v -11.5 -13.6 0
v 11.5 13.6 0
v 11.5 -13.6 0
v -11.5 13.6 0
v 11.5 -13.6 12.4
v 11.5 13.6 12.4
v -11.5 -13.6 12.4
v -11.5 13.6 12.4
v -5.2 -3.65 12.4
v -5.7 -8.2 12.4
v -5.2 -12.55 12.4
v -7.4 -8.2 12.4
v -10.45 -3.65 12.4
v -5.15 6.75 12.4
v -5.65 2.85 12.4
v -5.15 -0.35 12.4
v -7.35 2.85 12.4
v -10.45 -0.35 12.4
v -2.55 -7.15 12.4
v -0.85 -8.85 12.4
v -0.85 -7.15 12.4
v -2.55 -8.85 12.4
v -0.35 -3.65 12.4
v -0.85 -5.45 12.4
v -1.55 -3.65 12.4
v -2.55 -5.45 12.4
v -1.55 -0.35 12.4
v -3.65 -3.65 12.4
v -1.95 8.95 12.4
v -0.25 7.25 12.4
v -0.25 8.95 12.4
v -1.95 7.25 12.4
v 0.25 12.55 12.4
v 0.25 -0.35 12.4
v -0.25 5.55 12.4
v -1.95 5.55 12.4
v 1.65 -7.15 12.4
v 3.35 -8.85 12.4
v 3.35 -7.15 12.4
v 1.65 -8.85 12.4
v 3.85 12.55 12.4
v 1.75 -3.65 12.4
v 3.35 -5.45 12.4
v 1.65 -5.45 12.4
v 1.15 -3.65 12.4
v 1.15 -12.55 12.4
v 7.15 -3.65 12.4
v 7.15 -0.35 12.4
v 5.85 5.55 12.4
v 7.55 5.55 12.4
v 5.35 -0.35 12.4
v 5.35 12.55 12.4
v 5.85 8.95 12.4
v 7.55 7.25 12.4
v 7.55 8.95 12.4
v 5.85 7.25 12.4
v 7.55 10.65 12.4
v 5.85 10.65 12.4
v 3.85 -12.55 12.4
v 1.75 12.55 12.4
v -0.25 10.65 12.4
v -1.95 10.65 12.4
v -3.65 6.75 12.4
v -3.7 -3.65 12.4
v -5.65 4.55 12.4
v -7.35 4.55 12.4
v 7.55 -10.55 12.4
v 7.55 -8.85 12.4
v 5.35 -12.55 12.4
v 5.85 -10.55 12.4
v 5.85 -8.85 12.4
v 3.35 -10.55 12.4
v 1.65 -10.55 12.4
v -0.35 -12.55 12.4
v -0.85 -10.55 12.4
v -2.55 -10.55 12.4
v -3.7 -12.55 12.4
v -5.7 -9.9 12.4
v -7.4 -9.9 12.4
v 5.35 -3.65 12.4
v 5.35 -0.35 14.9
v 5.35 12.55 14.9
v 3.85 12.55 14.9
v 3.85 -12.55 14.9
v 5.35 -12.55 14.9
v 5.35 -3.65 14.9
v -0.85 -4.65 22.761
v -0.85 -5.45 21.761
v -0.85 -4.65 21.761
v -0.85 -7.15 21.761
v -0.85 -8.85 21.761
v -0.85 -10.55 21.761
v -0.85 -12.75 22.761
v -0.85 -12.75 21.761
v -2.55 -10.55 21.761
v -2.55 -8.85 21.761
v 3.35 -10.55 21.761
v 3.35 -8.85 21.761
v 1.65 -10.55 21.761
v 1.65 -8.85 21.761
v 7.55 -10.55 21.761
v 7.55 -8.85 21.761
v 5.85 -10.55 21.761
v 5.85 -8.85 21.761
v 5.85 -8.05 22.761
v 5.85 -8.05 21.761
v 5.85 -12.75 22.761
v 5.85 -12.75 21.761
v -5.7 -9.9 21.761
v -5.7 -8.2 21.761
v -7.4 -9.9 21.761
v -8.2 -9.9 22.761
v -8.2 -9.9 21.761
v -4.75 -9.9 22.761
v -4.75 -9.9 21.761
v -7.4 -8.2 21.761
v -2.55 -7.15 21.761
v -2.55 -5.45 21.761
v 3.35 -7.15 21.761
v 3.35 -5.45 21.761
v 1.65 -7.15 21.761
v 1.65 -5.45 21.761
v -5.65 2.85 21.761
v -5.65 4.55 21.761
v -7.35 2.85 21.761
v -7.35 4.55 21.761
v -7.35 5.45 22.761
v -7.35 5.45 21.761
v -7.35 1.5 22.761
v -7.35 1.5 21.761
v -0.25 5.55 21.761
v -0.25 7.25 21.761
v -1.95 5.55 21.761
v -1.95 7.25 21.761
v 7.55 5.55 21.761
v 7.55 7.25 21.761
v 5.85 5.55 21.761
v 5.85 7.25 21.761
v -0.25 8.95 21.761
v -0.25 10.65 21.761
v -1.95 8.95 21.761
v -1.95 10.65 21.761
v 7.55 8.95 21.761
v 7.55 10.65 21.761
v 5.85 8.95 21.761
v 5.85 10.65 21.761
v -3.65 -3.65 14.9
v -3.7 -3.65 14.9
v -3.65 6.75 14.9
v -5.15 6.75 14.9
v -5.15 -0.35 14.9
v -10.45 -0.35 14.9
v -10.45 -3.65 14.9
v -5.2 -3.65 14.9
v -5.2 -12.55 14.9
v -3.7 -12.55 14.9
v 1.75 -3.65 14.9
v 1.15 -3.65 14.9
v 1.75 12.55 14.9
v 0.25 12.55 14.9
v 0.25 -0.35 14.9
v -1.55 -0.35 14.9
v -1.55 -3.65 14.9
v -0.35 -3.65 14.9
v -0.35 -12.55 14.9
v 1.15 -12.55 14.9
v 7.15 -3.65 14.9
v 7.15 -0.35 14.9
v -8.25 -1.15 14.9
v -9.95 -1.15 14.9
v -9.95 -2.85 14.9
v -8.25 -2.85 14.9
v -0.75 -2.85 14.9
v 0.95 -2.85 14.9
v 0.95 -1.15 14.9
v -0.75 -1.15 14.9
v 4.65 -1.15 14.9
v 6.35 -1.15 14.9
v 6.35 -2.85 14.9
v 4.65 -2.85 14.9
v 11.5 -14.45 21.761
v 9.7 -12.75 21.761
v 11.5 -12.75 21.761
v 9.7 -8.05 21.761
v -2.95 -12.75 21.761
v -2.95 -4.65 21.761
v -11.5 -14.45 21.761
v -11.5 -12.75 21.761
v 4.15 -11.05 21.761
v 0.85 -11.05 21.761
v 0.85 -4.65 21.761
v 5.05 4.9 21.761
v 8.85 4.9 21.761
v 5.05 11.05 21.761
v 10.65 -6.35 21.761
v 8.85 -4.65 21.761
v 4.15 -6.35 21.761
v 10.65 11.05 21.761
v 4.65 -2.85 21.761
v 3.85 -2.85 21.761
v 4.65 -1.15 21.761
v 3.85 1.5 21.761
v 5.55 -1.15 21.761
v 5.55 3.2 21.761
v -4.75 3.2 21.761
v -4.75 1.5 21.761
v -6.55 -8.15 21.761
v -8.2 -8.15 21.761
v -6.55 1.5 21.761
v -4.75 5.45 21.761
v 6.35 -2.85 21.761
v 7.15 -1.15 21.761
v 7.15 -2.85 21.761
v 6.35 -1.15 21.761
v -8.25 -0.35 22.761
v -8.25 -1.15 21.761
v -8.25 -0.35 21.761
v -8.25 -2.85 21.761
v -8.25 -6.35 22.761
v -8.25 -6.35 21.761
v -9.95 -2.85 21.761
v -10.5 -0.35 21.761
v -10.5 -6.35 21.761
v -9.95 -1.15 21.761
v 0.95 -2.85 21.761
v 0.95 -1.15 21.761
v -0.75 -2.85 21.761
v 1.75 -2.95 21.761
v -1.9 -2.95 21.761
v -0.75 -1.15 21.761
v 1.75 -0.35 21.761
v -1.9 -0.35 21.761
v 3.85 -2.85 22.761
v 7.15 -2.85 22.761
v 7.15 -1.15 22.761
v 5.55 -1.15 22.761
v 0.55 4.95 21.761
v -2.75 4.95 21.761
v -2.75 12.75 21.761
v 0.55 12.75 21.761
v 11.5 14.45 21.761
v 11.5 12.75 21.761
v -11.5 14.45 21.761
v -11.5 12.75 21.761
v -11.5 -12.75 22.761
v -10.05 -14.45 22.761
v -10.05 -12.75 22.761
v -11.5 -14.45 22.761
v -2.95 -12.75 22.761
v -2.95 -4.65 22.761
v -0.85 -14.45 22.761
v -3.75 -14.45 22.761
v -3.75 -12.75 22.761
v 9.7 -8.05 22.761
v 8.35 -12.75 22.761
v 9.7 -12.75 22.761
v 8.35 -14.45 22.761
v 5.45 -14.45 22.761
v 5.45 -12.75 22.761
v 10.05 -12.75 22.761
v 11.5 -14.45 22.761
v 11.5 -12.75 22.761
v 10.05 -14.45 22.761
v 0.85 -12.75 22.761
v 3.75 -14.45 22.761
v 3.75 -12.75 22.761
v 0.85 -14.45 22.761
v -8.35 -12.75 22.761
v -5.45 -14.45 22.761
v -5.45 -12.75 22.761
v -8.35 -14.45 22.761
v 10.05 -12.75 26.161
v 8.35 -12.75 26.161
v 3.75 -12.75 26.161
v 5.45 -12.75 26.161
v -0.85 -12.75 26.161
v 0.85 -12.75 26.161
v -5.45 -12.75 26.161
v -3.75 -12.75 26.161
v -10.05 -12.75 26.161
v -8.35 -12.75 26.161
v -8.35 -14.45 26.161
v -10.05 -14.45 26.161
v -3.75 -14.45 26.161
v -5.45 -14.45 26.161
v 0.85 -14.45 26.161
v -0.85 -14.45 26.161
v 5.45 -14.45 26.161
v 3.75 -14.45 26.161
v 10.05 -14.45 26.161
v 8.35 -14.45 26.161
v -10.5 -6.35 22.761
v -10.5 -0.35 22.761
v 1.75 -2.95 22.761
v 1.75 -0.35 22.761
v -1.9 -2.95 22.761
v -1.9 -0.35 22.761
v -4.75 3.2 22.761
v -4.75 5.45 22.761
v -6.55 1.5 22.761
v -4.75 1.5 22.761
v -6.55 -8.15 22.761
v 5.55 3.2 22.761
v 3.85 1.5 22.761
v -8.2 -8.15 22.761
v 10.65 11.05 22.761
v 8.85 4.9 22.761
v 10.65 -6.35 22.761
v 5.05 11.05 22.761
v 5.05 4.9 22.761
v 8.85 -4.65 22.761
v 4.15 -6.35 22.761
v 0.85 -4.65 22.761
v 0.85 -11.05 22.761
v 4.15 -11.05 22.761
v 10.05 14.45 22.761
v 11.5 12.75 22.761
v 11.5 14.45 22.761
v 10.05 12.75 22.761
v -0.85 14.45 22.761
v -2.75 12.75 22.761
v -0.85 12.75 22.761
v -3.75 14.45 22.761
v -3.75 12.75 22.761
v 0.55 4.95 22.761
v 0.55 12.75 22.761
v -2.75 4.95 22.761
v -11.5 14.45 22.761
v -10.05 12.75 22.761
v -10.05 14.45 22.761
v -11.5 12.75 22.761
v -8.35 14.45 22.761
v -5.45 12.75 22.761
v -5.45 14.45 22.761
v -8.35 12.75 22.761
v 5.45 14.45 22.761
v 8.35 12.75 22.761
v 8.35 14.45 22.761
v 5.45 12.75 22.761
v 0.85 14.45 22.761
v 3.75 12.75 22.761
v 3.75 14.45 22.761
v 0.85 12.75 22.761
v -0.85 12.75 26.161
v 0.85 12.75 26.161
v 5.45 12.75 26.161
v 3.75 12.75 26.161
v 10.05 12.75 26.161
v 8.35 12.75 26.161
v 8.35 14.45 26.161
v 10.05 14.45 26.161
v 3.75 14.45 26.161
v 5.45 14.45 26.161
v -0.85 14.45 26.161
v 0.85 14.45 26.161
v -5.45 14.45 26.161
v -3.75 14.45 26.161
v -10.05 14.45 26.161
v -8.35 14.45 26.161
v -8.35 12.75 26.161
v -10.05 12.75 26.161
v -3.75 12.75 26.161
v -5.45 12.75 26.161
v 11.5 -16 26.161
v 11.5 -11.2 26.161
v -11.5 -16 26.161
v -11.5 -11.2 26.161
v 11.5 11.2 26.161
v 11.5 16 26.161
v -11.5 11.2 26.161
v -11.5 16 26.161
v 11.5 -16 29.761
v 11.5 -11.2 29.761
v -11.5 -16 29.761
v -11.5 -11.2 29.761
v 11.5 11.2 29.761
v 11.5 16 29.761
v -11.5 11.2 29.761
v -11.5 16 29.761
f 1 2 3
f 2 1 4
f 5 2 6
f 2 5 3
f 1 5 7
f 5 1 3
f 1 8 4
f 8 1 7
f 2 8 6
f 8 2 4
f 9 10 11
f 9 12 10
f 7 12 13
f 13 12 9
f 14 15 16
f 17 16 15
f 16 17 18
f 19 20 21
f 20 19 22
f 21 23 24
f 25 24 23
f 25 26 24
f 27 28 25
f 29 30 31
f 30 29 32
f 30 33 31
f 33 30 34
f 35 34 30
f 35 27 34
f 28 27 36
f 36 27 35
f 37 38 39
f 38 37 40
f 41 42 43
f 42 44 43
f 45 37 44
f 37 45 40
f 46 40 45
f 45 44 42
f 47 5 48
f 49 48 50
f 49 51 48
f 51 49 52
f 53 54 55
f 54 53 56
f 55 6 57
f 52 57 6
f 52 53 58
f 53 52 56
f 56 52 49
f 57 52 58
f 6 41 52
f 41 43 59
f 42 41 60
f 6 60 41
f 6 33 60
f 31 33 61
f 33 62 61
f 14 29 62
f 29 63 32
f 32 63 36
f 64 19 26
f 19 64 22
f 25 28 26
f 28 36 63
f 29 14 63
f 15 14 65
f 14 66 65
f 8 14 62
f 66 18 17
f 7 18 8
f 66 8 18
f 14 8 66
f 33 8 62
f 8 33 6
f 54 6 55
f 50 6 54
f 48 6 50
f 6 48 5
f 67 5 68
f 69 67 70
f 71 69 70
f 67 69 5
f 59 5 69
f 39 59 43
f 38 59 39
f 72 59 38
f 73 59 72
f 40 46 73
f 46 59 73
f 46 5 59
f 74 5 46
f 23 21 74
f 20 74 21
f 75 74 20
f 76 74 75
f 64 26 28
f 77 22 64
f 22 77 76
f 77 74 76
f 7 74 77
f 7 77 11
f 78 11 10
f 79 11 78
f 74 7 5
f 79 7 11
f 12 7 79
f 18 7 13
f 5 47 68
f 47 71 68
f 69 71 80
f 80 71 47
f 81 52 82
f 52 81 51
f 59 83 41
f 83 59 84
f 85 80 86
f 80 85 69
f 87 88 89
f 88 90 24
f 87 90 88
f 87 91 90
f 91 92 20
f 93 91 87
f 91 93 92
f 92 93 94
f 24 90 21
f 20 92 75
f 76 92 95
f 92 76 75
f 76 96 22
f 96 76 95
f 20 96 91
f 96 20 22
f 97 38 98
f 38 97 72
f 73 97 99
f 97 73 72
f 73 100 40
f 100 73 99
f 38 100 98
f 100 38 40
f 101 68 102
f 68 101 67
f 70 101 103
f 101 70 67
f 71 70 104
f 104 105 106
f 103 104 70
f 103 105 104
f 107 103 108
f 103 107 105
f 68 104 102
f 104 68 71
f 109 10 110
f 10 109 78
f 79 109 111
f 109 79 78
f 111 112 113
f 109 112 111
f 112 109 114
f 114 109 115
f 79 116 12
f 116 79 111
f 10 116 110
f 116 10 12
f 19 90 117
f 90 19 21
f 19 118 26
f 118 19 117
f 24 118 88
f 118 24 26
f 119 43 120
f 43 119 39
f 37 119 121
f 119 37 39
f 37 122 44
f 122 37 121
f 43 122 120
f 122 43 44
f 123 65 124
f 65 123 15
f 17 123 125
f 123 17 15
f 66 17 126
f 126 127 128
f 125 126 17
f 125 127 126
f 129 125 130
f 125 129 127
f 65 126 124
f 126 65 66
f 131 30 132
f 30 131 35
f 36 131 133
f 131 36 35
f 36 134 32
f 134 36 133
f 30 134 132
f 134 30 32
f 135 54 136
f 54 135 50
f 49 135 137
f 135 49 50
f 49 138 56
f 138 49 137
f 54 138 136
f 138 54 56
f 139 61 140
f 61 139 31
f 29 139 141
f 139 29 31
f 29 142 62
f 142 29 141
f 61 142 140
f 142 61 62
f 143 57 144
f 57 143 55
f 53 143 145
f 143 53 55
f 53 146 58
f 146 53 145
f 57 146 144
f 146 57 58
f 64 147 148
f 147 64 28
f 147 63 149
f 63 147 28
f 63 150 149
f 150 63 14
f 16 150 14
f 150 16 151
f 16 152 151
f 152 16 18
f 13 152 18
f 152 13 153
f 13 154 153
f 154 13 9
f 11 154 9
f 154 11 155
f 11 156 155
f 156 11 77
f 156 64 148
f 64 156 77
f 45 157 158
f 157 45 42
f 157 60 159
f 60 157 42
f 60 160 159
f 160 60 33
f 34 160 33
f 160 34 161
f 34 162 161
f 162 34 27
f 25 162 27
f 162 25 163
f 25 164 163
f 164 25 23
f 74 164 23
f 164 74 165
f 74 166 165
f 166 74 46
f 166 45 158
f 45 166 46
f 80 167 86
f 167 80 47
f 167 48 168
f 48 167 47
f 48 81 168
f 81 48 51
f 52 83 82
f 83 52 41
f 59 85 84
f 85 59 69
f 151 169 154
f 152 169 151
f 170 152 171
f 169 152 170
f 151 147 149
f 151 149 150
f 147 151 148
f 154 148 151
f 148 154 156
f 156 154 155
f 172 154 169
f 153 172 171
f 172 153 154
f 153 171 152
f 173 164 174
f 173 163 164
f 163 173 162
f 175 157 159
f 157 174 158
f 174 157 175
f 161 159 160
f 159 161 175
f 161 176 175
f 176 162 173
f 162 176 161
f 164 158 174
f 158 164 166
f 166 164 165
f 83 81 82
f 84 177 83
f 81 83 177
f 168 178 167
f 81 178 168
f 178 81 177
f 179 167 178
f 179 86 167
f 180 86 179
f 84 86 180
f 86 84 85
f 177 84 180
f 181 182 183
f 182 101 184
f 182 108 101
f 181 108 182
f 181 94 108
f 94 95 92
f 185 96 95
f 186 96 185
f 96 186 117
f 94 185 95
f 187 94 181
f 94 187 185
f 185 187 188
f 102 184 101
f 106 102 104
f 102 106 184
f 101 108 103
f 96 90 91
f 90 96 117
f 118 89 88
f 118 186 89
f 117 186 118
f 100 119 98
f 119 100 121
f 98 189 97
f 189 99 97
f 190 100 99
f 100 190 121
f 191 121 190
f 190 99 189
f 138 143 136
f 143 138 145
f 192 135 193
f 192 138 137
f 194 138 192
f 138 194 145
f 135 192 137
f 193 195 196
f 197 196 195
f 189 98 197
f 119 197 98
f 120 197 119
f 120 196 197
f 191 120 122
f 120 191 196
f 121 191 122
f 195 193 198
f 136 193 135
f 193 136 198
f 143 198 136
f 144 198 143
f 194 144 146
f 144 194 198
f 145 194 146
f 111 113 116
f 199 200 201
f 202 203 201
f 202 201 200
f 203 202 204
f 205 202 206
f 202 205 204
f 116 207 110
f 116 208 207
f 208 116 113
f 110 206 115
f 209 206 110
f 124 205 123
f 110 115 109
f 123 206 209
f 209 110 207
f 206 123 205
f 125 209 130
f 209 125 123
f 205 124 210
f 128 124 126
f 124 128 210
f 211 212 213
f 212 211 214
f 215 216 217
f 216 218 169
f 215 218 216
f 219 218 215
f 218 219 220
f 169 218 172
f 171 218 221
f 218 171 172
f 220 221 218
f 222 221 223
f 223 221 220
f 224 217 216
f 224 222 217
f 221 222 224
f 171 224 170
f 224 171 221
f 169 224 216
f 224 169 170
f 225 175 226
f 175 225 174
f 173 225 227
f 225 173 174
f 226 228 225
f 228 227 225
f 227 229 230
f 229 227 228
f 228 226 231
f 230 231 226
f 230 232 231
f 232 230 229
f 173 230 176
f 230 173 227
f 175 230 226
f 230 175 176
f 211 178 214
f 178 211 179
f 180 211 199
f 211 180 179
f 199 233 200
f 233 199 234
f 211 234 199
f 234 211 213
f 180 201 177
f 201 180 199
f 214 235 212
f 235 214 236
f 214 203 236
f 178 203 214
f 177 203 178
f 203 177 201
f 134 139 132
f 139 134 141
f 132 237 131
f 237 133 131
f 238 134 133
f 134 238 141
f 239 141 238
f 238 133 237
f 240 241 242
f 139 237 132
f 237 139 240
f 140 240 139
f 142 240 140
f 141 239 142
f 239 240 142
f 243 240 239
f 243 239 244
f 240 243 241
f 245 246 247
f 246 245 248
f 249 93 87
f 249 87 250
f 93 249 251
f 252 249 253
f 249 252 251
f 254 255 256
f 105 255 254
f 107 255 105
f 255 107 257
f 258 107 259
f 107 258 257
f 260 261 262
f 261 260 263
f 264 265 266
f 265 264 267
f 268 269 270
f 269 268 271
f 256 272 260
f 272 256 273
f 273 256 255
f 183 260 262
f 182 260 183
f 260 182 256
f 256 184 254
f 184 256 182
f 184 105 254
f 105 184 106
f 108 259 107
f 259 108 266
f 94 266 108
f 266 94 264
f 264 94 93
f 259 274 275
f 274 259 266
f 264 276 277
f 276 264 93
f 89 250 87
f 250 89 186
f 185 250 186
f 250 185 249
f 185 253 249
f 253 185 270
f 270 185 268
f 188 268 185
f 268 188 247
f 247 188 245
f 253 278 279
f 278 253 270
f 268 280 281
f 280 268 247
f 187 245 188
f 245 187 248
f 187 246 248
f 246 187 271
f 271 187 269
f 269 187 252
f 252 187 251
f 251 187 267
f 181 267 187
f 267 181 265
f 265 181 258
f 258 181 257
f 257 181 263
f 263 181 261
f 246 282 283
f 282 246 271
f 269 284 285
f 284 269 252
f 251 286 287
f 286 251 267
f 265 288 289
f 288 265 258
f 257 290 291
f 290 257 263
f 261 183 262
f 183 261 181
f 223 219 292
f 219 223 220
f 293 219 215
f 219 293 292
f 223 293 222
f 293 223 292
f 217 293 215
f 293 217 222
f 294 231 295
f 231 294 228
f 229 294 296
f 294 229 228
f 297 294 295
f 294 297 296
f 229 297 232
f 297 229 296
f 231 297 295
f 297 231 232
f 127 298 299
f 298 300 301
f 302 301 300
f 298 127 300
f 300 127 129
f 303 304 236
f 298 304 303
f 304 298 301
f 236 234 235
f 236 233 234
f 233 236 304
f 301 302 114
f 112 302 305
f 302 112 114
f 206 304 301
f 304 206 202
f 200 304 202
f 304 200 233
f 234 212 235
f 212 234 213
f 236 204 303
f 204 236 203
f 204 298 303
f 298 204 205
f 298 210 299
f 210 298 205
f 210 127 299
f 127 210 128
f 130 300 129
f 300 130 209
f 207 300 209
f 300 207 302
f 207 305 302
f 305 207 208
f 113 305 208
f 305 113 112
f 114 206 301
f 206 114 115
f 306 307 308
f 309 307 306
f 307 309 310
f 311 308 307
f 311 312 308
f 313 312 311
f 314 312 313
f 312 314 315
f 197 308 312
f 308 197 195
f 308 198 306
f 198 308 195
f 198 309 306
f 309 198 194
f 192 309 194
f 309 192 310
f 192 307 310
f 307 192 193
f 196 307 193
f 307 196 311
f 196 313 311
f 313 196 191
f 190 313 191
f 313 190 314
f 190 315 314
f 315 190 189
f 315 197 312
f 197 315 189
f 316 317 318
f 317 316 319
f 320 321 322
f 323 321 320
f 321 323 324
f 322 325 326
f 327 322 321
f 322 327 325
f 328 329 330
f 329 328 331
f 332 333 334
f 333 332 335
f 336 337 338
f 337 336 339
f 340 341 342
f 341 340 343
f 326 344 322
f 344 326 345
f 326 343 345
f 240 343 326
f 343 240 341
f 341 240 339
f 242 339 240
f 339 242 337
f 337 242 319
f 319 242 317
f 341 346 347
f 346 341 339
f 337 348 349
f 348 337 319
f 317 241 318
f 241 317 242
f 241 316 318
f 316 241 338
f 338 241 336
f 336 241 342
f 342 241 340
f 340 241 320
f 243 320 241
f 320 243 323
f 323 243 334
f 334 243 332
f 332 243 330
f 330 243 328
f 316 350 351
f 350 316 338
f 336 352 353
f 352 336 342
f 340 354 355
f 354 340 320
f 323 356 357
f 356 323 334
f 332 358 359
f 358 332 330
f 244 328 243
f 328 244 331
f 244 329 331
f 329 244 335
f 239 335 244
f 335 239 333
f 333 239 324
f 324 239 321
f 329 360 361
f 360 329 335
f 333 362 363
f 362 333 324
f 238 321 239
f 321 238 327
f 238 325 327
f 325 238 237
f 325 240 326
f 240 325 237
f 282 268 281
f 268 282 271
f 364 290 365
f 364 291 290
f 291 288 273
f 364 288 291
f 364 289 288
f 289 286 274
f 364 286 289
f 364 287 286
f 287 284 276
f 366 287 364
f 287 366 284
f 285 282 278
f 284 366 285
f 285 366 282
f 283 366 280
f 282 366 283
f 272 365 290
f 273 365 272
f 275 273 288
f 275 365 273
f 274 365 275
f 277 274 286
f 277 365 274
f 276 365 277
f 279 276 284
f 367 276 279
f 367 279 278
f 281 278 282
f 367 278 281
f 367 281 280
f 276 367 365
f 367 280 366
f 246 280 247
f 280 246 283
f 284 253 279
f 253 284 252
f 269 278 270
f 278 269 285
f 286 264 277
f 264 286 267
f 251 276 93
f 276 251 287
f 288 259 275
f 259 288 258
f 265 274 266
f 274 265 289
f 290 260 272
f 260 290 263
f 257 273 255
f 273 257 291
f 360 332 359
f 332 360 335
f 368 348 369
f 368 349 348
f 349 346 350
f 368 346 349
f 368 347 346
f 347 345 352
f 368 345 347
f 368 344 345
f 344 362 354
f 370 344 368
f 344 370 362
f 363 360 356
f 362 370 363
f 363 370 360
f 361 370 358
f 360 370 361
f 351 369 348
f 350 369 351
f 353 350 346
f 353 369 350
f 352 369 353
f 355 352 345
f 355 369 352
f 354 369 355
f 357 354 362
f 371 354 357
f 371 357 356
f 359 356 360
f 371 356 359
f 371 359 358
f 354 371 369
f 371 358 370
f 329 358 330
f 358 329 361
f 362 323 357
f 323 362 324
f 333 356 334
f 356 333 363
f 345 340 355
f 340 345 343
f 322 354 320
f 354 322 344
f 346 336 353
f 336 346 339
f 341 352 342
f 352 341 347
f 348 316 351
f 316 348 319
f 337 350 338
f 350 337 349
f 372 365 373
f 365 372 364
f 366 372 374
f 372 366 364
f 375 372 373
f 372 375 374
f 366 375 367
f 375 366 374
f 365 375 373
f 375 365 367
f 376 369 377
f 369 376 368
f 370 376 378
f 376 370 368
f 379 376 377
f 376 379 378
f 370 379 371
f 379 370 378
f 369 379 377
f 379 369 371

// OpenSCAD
// Generated by SolidPython 0.4.2 on 2020-09-29 23:21:29
//!OpenSCAD

scale(v = 0.0100000000) {
	translate(v = [-1150, -1360, 0]) {
		union() {
			color(c = [0.4000000000, 0.4000000000, 0.4000000000]) {
				translate(v = [0, 0, 0]) {
					linear_extrude(height = 1000.0000000000) {
						polygon(paths = [[0, 1, 2, 3]], points = [[0, 0], [0, 2720], [2300, 2720], [2300, 0]]);
					}
				}
			}
			color(c = [0.2000000000, 0.6000000000, 0.2000000000]) {
				translate(v = [0, 0, 1000.0000000000]) {
					linear_extrude(height = 120.0000000000) {
						polygon(paths = [[0, 1, 2, 3]], points = [[0, 1305], [0, 2720], [2300, 2720], [2300, 1305]]);
					}
				}
			}
			color(c = [0.4000000000, 0.4000000000, 0.4000000000]) {
				translate(v = [0, 0, 1000.0000000000]) {
					linear_extrude(height = 120.0000000000) {
						polygon(paths = [[0, 1, 2, 3]], points = [[0, 0], [0, 1305], [2300, 1305], [2300, 0]]);
					}
				}
			}
			color(c = [0.9000000000, 0.6000000000, 0.6000000000]) {
				translate(v = [0, 0, 1120.0000000000]) {
					linear_extrude(height = 120.0000000000) {
						polygon(paths = [[0, 1, 2, 3]], points = [[375, 1485], [375, 1905], [635, 1905], [635, 1485]]);
					}
				}
			}
			color(c = [0.9000000000, 0.6000000000, 0.6000000000]) {
				translate(v = [0, 0, 1120.0000000000]) {
					linear_extrude(height = 120.0000000000) {
						polygon(paths = [[0, 1, 2, 3, 4, 5]], points = [[785, 1485], [785, 1905], [915, 1905], [915, 2485], [1175, 2485], [1175, 1485]]);
					}
				}
			}
			color(c = [0.9000000000, 0.6000000000, 0.6000000000]) {
				translate(v = [0, 0, 1120.0000000000]) {
					linear_extrude(height = 120.0000000000) {
						polygon(paths = [[0, 1, 2, 3]], points = [[1325, 1485], [1325, 2485], [1535, 2485], [1535, 1485]]);
					}
				}
			}
			color(c = [0.9000000000, 0.6000000000, 0.6000000000]) {
				translate(v = [0, 0, 1120.0000000000]) {
					linear_extrude(height = 120.0000000000) {
						polygon(paths = [[0, 1, 2, 3]], points = [[1685, 1485], [1685, 2485], [1945, 2485], [1945, 1485]]);
					}
				}
			}
			color(c = [0.9000000000, 0.6000000000, 0.9000000000]) {
				translate(v = [0, 0, 1120.0000000000]) {
					linear_extrude(height = 120.0000000000) {
						polygon(paths = [[0, 1, 2, 3]], points = [[370, 235], [370, 655], [630, 655], [630, 235]]);
					}
				}
			}
			color(c = [0.9000000000, 0.6000000000, 0.9000000000]) {
				translate(v = [0, 0, 1120.0000000000]) {
					linear_extrude(height = 120.0000000000) {
						polygon(paths = [[0, 1, 2, 3, 4, 5]], points = [[780, 235], [780, 655], [855, 655], [855, 885], [1115, 885], [1115, 235]]);
					}
				}
			}
			color(c = [0.9000000000, 0.6000000000, 0.9000000000]) {
				translate(v = [0, 0, 1120.0000000000]) {
					linear_extrude(height = 120.0000000000) {
						polygon(paths = [[0, 1, 2, 3]], points = [[1265, 235], [1265, 885], [1535, 885], [1535, 235]]);
					}
				}
			}
			color(c = [0.9000000000, 0.6000000000, 0.9000000000]) {
				translate(v = [0, 0, 1120.0000000000]) {
					linear_extrude(height = 120.0000000000) {
						polygon(paths = [[0, 1, 2, 3]], points = [[1685, 235], [1685, 885], [1945, 885], [1945, 235]]);
					}
				}
			}
			color(c = [0.2000000000, 0.6000000000, 0.2000000000]) {
				translate(v = [0, 0, 1120.0000000000]) {
					linear_extrude(height = 120.0000000000) {
						difference() {
							polygon(paths = [[0, 1, 2, 3]], points = [[0, 1305], [0, 2720], [2300, 2720], [2300, 1305]]);
							polygon(paths = [[0, 1, 2, 3]], points = [[375, 1485], [635, 1485], [635, 1905], [375, 1905]]);
							polygon(paths = [[0, 1, 2, 3]], points = [[1325, 1485], [1535, 1485], [1535, 2485], [1325, 2485]]);
							polygon(paths = [[0, 1, 2, 3]], points = [[1685, 1485], [1945, 1485], [1945, 2485], [1685, 2485]]);
							polygon(paths = [[0, 1, 2, 3, 4, 5]], points = [[785, 1485], [1175, 1485], [1175, 2485], [915, 2485], [915, 1905], [785, 1905]]);
						}
					}
				}
			}
			color(c = [0.4000000000, 0.4000000000, 0.4000000000]) {
				translate(v = [0, 0, 1120.0000000000]) {
					linear_extrude(height = 120.0000000000) {
						difference() {
							polygon(paths = [[0, 1, 2, 3]], points = [[0, 0], [0, 1305], [2300, 1305], [2300, 0]]);
							polygon(paths = [[0, 1, 2, 3]], points = [[370, 235], [630, 235], [630, 655], [370, 655]]);
							polygon(paths = [[0, 1, 2, 3]], points = [[1265, 235], [1535, 235], [1535, 885], [1265, 885]]);
							polygon(paths = [[0, 1, 2, 3]], points = [[1685, 235], [1945, 235], [1945, 885], [1685, 885]]);
							polygon(paths = [[0, 1, 2, 3, 4, 5]], points = [[780, 235], [1115, 235], [1115, 885], [855, 885], [855, 655], [780, 655]]);
						}
					}
				}
			}
			color(c = [0.1000000000, 0.1000000000, 0.1000000000]) {
				translate(v = [0, 0, 1240.0000000000]) {
					linear_extrude(height = 70.0000000000) {
						polygon(paths = [[0, 1, 2, 3]], points = [[895, 305], [895, 475], [1065, 475], [1065, 305]]);
					}
				}
			}
			color(c = [0.1000000000, 0.1000000000, 0.1000000000]) {
				translate(v = [0, 0, 1240.0000000000]) {
					linear_extrude(height = 70.0000000000) {
						polygon(paths = [[0, 1, 2, 3]], points = [[1315, 305], [1315, 475], [1485, 475], [1485, 305]]);
					}
				}
			}
			color(c = [0.1000000000, 0.1000000000, 0.1000000000]) {
				translate(v = [0, 0, 1240.0000000000]) {
					linear_extrude(height = 70.0000000000) {
						polygon(paths = [[0, 1, 2, 3]], points = [[1735, 305], [1735, 475], [1905, 475], [1905, 305]]);
					}
				}
			}
			color(c = [0.1000000000, 0.1000000000, 0.1000000000]) {
				translate(v = [0, 0, 1240.0000000000]) {
					linear_extrude(height = 70.0000000000) {
						polygon(paths = [[0, 1, 2, 3]], points = [[410, 370], [410, 540], [580, 540], [580, 370]]);
					}
				}
			}
			color(c = [0.1000000000, 0.1000000000, 0.1000000000]) {
				translate(v = [0, 0, 1240.0000000000]) {
					linear_extrude(height = 70.0000000000) {
						polygon(paths = [[0, 1, 2, 3]], points = [[895, 645], [895, 815], [1065, 815], [1065, 645]]);
					}
				}
			}
			color(c = [0.1000000000, 0.1000000000, 0.1000000000]) {
				translate(v = [0, 0, 1240.0000000000]) {
					linear_extrude(height = 70.0000000000) {
						polygon(paths = [[0, 1, 2, 3]], points = [[1315, 645], [1315, 815], [1485, 815], [1485, 645]]);
					}
				}
			}
			color(c = [0.1000000000, 0.1000000000, 0.1000000000]) {
				translate(v = [0, 0, 1240.0000000000]) {
					linear_extrude(height = 70.0000000000) {
						polygon(paths = [[0, 1, 2, 3]], points = [[415, 1645], [415, 1815], [585, 1815], [585, 1645]]);
					}
				}
			}
			color(c = [0.1000000000, 0.1000000000, 0.1000000000]) {
				translate(v = [0, 0, 1240.0000000000]) {
					linear_extrude(height = 70.0000000000) {
						polygon(paths = [[0, 1, 2, 3]], points = [[955, 1915], [955, 2085], [1125, 2085], [1125, 1915]]);
					}
				}
			}
			color(c = [0.1000000000, 0.1000000000, 0.1000000000]) {
				translate(v = [0, 0, 1240.0000000000]) {
					linear_extrude(height = 70.0000000000) {
						polygon(paths = [[0, 1, 2, 3]], points = [[1735, 1915], [1735, 2085], [1905, 2085], [1905, 1915]]);
					}
				}
			}
			color(c = [0.1000000000, 0.1000000000, 0.1000000000]) {
				translate(v = [0, 0, 1240.0000000000]) {
					linear_extrude(height = 70.0000000000) {
						polygon(paths = [[0, 1, 2, 3]], points = [[955, 2255], [955, 2425], [1125, 2425], [1125, 2255]]);
					}
				}
			}
			color(c = [0.1000000000, 0.1000000000, 0.1000000000]) {
				translate(v = [0, 0, 1240.0000000000]) {
					linear_extrude(height = 70.0000000000) {
						polygon(paths = [[0, 1, 2, 3]], points = [[1735, 2255], [1735, 2425], [1905, 2425], [1905, 2255]]);
					}
				}
			}
			color(c = [1.0000000000, 1.0000000000, 1.0000000000]) {
				translate(v = [0, 0, 1240.0000000000]) {
					linear_extrude(height = 70.0000000000) {
						polygon(paths = [[0, 1, 2, 3, 4, 5, 6, 7, 8, 9]], points = [[630, 105], [630, 995], [105, 995], [105, 1325], [635, 1325], [635, 2035], [785, 2035], [785, 995], [780, 995], [780, 105]]);
					}
				}
			}
			color(c = [1.0000000000, 1.0000000000, 1.0000000000]) {
				translate(v = [0, 0, 1240.0000000000]) {
					linear_extrude(height = 70.0000000000) {
						polygon(paths = [[0, 1, 2, 3, 4, 5, 6, 7, 8, 9]], points = [[1115, 105], [1115, 995], [995, 995], [995, 1325], [1175, 1325], [1175, 2615], [1325, 2615], [1325, 995], [1265, 995], [1265, 105]]);
					}
				}
			}
			color(c = [1.0000000000, 1.0000000000, 1.0000000000]) {
				translate(v = [0, 0, 1240.0000000000]) {
					linear_extrude(height = 70.0000000000) {
						polygon(paths = [[0, 1, 2, 3, 4, 5, 6, 7]], points = [[1535, 105], [1535, 2615], [1685, 2615], [1685, 1325], [1865, 1325], [1865, 995], [1685, 995], [1685, 105]]);
					}
				}
			}
			color(c = [0.1000000000, 0.1000000000, 0.1000000000]) {
				translate(v = [0, 0, 1310.0000000000]) {
					linear_extrude(height = 180.0000000000) {
						polygon(paths = [[0, 1, 2, 3]], points = [[895, 305], [895, 475], [1065, 475], [1065, 305]]);
					}
				}
			}
			color(c = [0.1000000000, 0.1000000000, 0.1000000000]) {
				translate(v = [0, 0, 1310.0000000000]) {
					linear_extrude(height = 180.0000000000) {
						polygon(paths = [[0, 1, 2, 3]], points = [[1315, 305], [1315, 475], [1485, 475], [1485, 305]]);
					}
				}
			}
			color(c = [0.1000000000, 0.1000000000, 0.1000000000]) {
				translate(v = [0, 0, 1310.0000000000]) {
					linear_extrude(height = 180.0000000000) {
						polygon(paths = [[0, 1, 2, 3]], points = [[1735, 305], [1735, 475], [1905, 475], [1905, 305]]);
					}
				}
			}
			color(c = [0.1000000000, 0.1000000000, 0.1000000000]) {
				translate(v = [0, 0, 1310.0000000000]) {
					linear_extrude(height = 180.0000000000) {
						polygon(paths = [[0, 1, 2, 3]], points = [[410, 370], [410, 540], [580, 540], [580, 370]]);
					}
				}
			}
			color(c = [0.1000000000, 0.1000000000, 0.1000000000]) {
				translate(v = [0, 0, 1310.0000000000]) {
					linear_extrude(height = 180.0000000000) {
						polygon(paths = [[0, 1, 2, 3]], points = [[895, 645], [895, 815], [1065, 815], [1065, 645]]);
					}
				}
			}
			color(c = [0.1000000000, 0.1000000000, 0.1000000000]) {
				translate(v = [0, 0, 1310.0000000000]) {
					linear_extrude(height = 180.0000000000) {
						polygon(paths = [[0, 1, 2, 3]], points = [[1315, 645], [1315, 815], [1485, 815], [1485, 645]]);
					}
				}
			}
			color(c = [0.1000000000, 0.1000000000, 0.1000000000]) {
				translate(v = [0, 0, 1310.0000000000]) {
					linear_extrude(height = 180.0000000000) {
						polygon(paths = [[0, 1, 2, 3]], points = [[415, 1645], [415, 1815], [585, 1815], [585, 1645]]);
					}
				}
			}
			color(c = [0.1000000000, 0.1000000000, 0.1000000000]) {
				translate(v = [0, 0, 1310.0000000000]) {
					linear_extrude(height = 180.0000000000) {
						polygon(paths = [[0, 1, 2, 3]], points = [[955, 1915], [955, 2085], [1125, 2085], [1125, 1915]]);
					}
				}
			}
			color(c = [0.1000000000, 0.1000000000, 0.1000000000]) {
				translate(v = [0, 0, 1310.0000000000]) {
					linear_extrude(height = 180.0000000000) {
						polygon(paths = [[0, 1, 2, 3]], points = [[1735, 1915], [1735, 2085], [1905, 2085], [1905, 1915]]);
					}
				}
			}
			color(c = [0.1000000000, 0.1000000000, 0.1000000000]) {
				translate(v = [0, 0, 1310.0000000000]) {
					linear_extrude(height = 180.0000000000) {
						polygon(paths = [[0, 1, 2, 3]], points = [[955, 2255], [955, 2425], [1125, 2425], [1125, 2255]]);
					}
				}
			}
			color(c = [0.1000000000, 0.1000000000, 0.1000000000]) {
				translate(v = [0, 0, 1310.0000000000]) {
					linear_extrude(height = 180.0000000000) {
						polygon(paths = [[0, 1, 2, 3]], points = [[1735, 2255], [1735, 2425], [1905, 2425], [1905, 2255]]);
					}
				}
			}
			color(c = [0.7000000000, 0, 0]) {
				translate(v = [0, 0, 1310.0000000000]) {
					linear_extrude(height = 180.0000000000) {
						polygon(paths = [[0, 1, 2, 3, 4, 5, 6, 7, 8, 9]], points = [[630, 105], [630, 995], [105, 995], [105, 1325], [635, 1325], [635, 2035], [785, 2035], [785, 995], [780, 995], [780, 105]]);
					}
				}
			}
			color(c = [0.7000000000, 0, 0]) {
				translate(v = [0, 0, 1310.0000000000]) {
					linear_extrude(height = 180.0000000000) {
						polygon(paths = [[0, 1, 2, 3, 4, 5, 6, 7, 8, 9]], points = [[1115, 105], [1115, 995], [995, 995], [995, 1325], [1175, 1325], [1175, 2615], [1325, 2615], [1325, 995], [1265, 995], [1265, 105]]);
					}
				}
			}
			color(c = [0.7000000000, 0, 0]) {
				translate(v = [0, 0, 1310.0000000000]) {
					linear_extrude(height = 180.0000000000) {
						polygon(paths = [[0, 1, 2, 3, 4, 5, 6, 7]], points = [[1535, 105], [1535, 2615], [1685, 2615], [1685, 1325], [1865, 1325], [1865, 995], [1685, 995], [1685, 105]]);
					}
				}
			}
			color(c = [0.1000000000, 0.1000000000, 0.1000000000]) {
				translate(v = [0, 0, 1490.0000000000]) {
					linear_extrude(height = 686.1000000000) {
						polygon(paths = [[0, 1, 2, 3]], points = [[895, 305], [895, 475], [1065, 475], [1065, 305]]);
					}
				}
			}
			color(c = [0.1000000000, 0.1000000000, 0.1000000000]) {
				translate(v = [0, 0, 1490.0000000000]) {
					linear_extrude(height = 686.1000000000) {
						polygon(paths = [[0, 1, 2, 3]], points = [[1315, 305], [1315, 475], [1485, 475], [1485, 305]]);
					}
				}
			}
			color(c = [0.1000000000, 0.1000000000, 0.1000000000]) {
				translate(v = [0, 0, 1490.0000000000]) {
					linear_extrude(height = 686.1000000000) {
						polygon(paths = [[0, 1, 2, 3]], points = [[1735, 305], [1735, 475], [1905, 475], [1905, 305]]);
					}
				}
			}
			color(c = [0.1000000000, 0.1000000000, 0.1000000000]) {
				translate(v = [0, 0, 1490.0000000000]) {
					linear_extrude(height = 686.1000000000) {
						polygon(paths = [[0, 1, 2, 3]], points = [[410, 370], [410, 540], [580, 540], [580, 370]]);
					}
				}
			}
			color(c = [0.1000000000, 0.1000000000, 0.1000000000]) {
				translate(v = [0, 0, 1490.0000000000]) {
					linear_extrude(height = 686.1000000000) {
						polygon(paths = [[0, 1, 2, 3]], points = [[895, 645], [895, 815], [1065, 815], [1065, 645]]);
					}
				}
			}
			color(c = [0.1000000000, 0.1000000000, 0.1000000000]) {
				translate(v = [0, 0, 1490.0000000000]) {
					linear_extrude(height = 686.1000000000) {
						polygon(paths = [[0, 1, 2, 3]], points = [[1315, 645], [1315, 815], [1485, 815], [1485, 645]]);
					}
				}
			}
			color(c = [0.1000000000, 0.1000000000, 0.1000000000]) {
				translate(v = [0, 0, 1490.0000000000]) {
					linear_extrude(height = 686.1000000000) {
						polygon(paths = [[0, 1, 2, 3]], points = [[155, 1075], [155, 1245], [325, 1245], [325, 1075]]);
					}
				}
			}
			color(c = [0.1000000000, 0.1000000000, 0.1000000000]) {
				translate(v = [0, 0, 1490.0000000000]) {
					linear_extrude(height = 686.1000000000) {
						polygon(paths = [[0, 1, 2, 3]], points = [[1075, 1075], [1075, 1245], [1245, 1245], [1245, 1075]]);
					}
				}
			}
			color(c = [0.1000000000, 0.1000000000, 0.1000000000]) {
				translate(v = [0, 0, 1490.0000000000]) {
					linear_extrude(height = 686.1000000000) {
						polygon(paths = [[0, 1, 2, 3]], points = [[1615, 1075], [1615, 1245], [1785, 1245], [1785, 1075]]);
					}
				}
			}
			color(c = [0.1000000000, 0.1000000000, 0.1000000000]) {
				translate(v = [0, 0, 1490.0000000000]) {
					linear_extrude(height = 686.1000000000) {
						polygon(paths = [[0, 1, 2, 3]], points = [[415, 1645], [415, 1815], [585, 1815], [585, 1645]]);
					}
				}
			}
			color(c = [0.1000000000, 0.1000000000, 0.1000000000]) {
				translate(v = [0, 0, 1490.0000000000]) {
					linear_extrude(height = 686.1000000000) {
						polygon(paths = [[0, 1, 2, 3]], points = [[955, 1915], [955, 2085], [1125, 2085], [1125, 1915]]);
					}
				}
			}
			color(c = [0.1000000000, 0.1000000000, 0.1000000000]) {
				translate(v = [0, 0, 1490.0000000000]) {
					linear_extrude(height = 686.1000000000) {
						polygon(paths = [[0, 1, 2, 3]], points = [[1735, 1915], [1735, 2085], [1905, 2085], [1905, 1915]]);
					}
				}
			}
			color(c = [0.1000000000, 0.1000000000, 0.1000000000]) {
				translate(v = [0, 0, 1490.0000000000]) {
					linear_extrude(height = 686.1000000000) {
						polygon(paths = [[0, 1, 2, 3]], points = [[955, 2255], [955, 2425], [1125, 2425], [1125, 2255]]);
					}
				}
			}
			color(c = [0.1000000000, 0.1000000000, 0.1000000000]) {
				translate(v = [0, 0, 1490.0000000000]) {
					linear_extrude(height = 686.1000000000) {
						polygon(paths = [[0, 1, 2, 3]], points = [[1735, 2255], [1735, 2425], [1905, 2425], [1905, 2255]]);
					}
				}
			}
			color(c = [0.9000000000, 0.6000000000, 0.6000000000]) {
				translate(v = [0, 0, 2176.1000000000]) {
					linear_extrude(height = 100.0000000000) {
						polygon(paths = [[0, 1, 2, 3, 4, 5, 6, 7, 8, 9, 10, 11]], points = [[0, -85], [0, 85], [855, 85], [855, 895], [1065, 895], [1065, 85], [1735, 85], [1735, 555], [2120, 555], [2120, 85], [2300, 85], [2300, -85]]);
					}
				}
			}
			color(c = [0.9000000000, 0.6000000000, 0.6000000000]) {
				translate(v = [0, 0, 2176.1000000000]) {
					linear_extrude(height = 100.0000000000) {
						polygon(paths = [[0, 1, 2, 3]], points = [[100, 725], [100, 1325], [325, 1325], [325, 725]]);
					}
				}
			}
			color(c = [0.9000000000, 0.6000000000, 0.6000000000]) {
				translate(v = [0, 0, 2176.1000000000]) {
					linear_extrude(height = 100.0000000000) {
						polygon(paths = [[0, 1, 2, 3]], points = [[960, 1065], [960, 1325], [1325, 1325], [1325, 1065]]);
					}
				}
			}
			color(c = [0.9000000000, 0.6000000000, 0.6000000000]) {
				translate(v = [0, 0, 2176.1000000000]) {
					linear_extrude(height = 100.0000000000) {
						polygon(paths = [[0, 1, 2, 3, 4, 5, 6, 7, 8, 9, 10, 11, 12, 13, 14, 15]], points = [[330, 370], [330, 545], [495, 545], [495, 1510], [415, 1510], [415, 1905], [675, 1905], [675, 1680], [1705, 1680], [1705, 1245], [1865, 1245], [1865, 1075], [1535, 1075], [1535, 1510], [675, 1510], [675, 370]]);
					}
				}
			}
			color(c = [0.9000000000, 0.6000000000, 0.6000000000]) {
				translate(v = [0, 0, 2176.1000000000]) {
					linear_extrude(height = 100.0000000000) {
						polygon(paths = [[0, 1, 2, 3, 4, 5, 6, 7, 8, 9]], points = [[1235, 255], [1235, 895], [2035, 895], [2035, 1850], [1655, 1850], [1655, 2465], [2215, 2465], [2215, 725], [1565, 725], [1565, 255]]);
					}
				}
			}
			color(c = [0.9000000000, 0.6000000000, 0.6000000000]) {
				translate(v = [0, 0, 2176.1000000000]) {
					linear_extrude(height = 100.0000000000) {
						polygon(paths = [[0, 1, 2, 3, 4, 5, 6, 7]], points = [[875, 1855], [875, 2635], [0, 2635], [0, 2805], [2300, 2805], [2300, 2635], [1205, 2635], [1205, 1855]]);
					}
				}
			}
			color(c = [0.5000000000, 0.5000000000, 0.5000000000]) {
				translate(v = [0, 0, 2276.1000000000]) {
					linear_extrude(height = 340.0000000000) {
						polygon(paths = [[0, 1, 2, 3]], points = [[145, -85], [145, 85], [315, 85], [315, -85]]);
					}
				}
			}
			color(c = [0.5000000000, 0.5000000000, 0.5000000000]) {
				translate(v = [0, 0, 2276.1000000000]) {
					linear_extrude(height = 340.0000000000) {
						polygon(paths = [[0, 1, 2, 3]], points = [[605, -85], [605, 85], [775, 85], [775, -85]]);
					}
				}
			}
			color(c = [0.5000000000, 0.5000000000, 0.5000000000]) {
				translate(v = [0, 0, 2276.1000000000]) {
					linear_extrude(height = 340.0000000000) {
						polygon(paths = [[0, 1, 2, 3]], points = [[1065, -85], [1065, 85], [1235, 85], [1235, -85]]);
					}
				}
			}
			color(c = [0.5000000000, 0.5000000000, 0.5000000000]) {
				translate(v = [0, 0, 2276.1000000000]) {
					linear_extrude(height = 340.0000000000) {
						polygon(paths = [[0, 1, 2, 3]], points = [[1525, -85], [1525, 85], [1695, 85], [1695, -85]]);
					}
				}
			}
			color(c = [0.5000000000, 0.5000000000, 0.5000000000]) {
				translate(v = [0, 0, 2276.1000000000]) {
					linear_extrude(height = 340.0000000000) {
						polygon(paths = [[0, 1, 2, 3]], points = [[1985, -85], [1985, 85], [2155, 85], [2155, -85]]);
					}
				}
			}
			color(c = [0.5000000000, 0.5000000000, 0.5000000000]) {
				translate(v = [0, 0, 2276.1000000000]) {
					linear_extrude(height = 340.0000000000) {
						polygon(paths = [[0, 1, 2, 3]], points = [[145, 2635], [145, 2805], [315, 2805], [315, 2635]]);
					}
				}
			}
			color(c = [0.5000000000, 0.5000000000, 0.5000000000]) {
				translate(v = [0, 0, 2276.1000000000]) {
					linear_extrude(height = 340.0000000000) {
						polygon(paths = [[0, 1, 2, 3]], points = [[605, 2635], [605, 2805], [775, 2805], [775, 2635]]);
					}
				}
			}
			color(c = [0.5000000000, 0.5000000000, 0.5000000000]) {
				translate(v = [0, 0, 2276.1000000000]) {
					linear_extrude(height = 340.0000000000) {
						polygon(paths = [[0, 1, 2, 3]], points = [[1065, 2635], [1065, 2805], [1235, 2805], [1235, 2635]]);
					}
				}
			}
			color(c = [0.5000000000, 0.5000000000, 0.5000000000]) {
				translate(v = [0, 0, 2276.1000000000]) {
					linear_extrude(height = 340.0000000000) {
						polygon(paths = [[0, 1, 2, 3]], points = [[1525, 2635], [1525, 2805], [1695, 2805], [1695, 2635]]);
					}
				}
			}
			color(c = [0.5000000000, 0.5000000000, 0.5000000000]) {
				translate(v = [0, 0, 2276.1000000000]) {
					linear_extrude(height = 340.0000000000) {
						polygon(paths = [[0, 1, 2, 3]], points = [[1985, 2635], [1985, 2805], [2155, 2805], [2155, 2635]]);
					}
				}
			}
			color(c = [0.3000000000, 0.3000000000, 1]) {
				translate(v = [0, 0, 2616.1000000000]) {
					linear_extrude(height = 360.0000000000) {
						polygon(paths = [[0, 1, 2, 3]], points = [[0, -240], [0, 240], [2300, 240], [2300, -240]]);
					}
				}
			}
			color(c = [0.3000000000, 0.3000000000, 1]) {
				translate(v = [0, 0, 2616.1000000000]) {
					linear_extrude(height = 360.0000000000) {
						polygon(paths = [[0, 1, 2, 3]], points = [[0, 2480], [0, 2960], [2300, 2960], [2300, 2480]]);
					}
				}
			}
		}
	}
}
